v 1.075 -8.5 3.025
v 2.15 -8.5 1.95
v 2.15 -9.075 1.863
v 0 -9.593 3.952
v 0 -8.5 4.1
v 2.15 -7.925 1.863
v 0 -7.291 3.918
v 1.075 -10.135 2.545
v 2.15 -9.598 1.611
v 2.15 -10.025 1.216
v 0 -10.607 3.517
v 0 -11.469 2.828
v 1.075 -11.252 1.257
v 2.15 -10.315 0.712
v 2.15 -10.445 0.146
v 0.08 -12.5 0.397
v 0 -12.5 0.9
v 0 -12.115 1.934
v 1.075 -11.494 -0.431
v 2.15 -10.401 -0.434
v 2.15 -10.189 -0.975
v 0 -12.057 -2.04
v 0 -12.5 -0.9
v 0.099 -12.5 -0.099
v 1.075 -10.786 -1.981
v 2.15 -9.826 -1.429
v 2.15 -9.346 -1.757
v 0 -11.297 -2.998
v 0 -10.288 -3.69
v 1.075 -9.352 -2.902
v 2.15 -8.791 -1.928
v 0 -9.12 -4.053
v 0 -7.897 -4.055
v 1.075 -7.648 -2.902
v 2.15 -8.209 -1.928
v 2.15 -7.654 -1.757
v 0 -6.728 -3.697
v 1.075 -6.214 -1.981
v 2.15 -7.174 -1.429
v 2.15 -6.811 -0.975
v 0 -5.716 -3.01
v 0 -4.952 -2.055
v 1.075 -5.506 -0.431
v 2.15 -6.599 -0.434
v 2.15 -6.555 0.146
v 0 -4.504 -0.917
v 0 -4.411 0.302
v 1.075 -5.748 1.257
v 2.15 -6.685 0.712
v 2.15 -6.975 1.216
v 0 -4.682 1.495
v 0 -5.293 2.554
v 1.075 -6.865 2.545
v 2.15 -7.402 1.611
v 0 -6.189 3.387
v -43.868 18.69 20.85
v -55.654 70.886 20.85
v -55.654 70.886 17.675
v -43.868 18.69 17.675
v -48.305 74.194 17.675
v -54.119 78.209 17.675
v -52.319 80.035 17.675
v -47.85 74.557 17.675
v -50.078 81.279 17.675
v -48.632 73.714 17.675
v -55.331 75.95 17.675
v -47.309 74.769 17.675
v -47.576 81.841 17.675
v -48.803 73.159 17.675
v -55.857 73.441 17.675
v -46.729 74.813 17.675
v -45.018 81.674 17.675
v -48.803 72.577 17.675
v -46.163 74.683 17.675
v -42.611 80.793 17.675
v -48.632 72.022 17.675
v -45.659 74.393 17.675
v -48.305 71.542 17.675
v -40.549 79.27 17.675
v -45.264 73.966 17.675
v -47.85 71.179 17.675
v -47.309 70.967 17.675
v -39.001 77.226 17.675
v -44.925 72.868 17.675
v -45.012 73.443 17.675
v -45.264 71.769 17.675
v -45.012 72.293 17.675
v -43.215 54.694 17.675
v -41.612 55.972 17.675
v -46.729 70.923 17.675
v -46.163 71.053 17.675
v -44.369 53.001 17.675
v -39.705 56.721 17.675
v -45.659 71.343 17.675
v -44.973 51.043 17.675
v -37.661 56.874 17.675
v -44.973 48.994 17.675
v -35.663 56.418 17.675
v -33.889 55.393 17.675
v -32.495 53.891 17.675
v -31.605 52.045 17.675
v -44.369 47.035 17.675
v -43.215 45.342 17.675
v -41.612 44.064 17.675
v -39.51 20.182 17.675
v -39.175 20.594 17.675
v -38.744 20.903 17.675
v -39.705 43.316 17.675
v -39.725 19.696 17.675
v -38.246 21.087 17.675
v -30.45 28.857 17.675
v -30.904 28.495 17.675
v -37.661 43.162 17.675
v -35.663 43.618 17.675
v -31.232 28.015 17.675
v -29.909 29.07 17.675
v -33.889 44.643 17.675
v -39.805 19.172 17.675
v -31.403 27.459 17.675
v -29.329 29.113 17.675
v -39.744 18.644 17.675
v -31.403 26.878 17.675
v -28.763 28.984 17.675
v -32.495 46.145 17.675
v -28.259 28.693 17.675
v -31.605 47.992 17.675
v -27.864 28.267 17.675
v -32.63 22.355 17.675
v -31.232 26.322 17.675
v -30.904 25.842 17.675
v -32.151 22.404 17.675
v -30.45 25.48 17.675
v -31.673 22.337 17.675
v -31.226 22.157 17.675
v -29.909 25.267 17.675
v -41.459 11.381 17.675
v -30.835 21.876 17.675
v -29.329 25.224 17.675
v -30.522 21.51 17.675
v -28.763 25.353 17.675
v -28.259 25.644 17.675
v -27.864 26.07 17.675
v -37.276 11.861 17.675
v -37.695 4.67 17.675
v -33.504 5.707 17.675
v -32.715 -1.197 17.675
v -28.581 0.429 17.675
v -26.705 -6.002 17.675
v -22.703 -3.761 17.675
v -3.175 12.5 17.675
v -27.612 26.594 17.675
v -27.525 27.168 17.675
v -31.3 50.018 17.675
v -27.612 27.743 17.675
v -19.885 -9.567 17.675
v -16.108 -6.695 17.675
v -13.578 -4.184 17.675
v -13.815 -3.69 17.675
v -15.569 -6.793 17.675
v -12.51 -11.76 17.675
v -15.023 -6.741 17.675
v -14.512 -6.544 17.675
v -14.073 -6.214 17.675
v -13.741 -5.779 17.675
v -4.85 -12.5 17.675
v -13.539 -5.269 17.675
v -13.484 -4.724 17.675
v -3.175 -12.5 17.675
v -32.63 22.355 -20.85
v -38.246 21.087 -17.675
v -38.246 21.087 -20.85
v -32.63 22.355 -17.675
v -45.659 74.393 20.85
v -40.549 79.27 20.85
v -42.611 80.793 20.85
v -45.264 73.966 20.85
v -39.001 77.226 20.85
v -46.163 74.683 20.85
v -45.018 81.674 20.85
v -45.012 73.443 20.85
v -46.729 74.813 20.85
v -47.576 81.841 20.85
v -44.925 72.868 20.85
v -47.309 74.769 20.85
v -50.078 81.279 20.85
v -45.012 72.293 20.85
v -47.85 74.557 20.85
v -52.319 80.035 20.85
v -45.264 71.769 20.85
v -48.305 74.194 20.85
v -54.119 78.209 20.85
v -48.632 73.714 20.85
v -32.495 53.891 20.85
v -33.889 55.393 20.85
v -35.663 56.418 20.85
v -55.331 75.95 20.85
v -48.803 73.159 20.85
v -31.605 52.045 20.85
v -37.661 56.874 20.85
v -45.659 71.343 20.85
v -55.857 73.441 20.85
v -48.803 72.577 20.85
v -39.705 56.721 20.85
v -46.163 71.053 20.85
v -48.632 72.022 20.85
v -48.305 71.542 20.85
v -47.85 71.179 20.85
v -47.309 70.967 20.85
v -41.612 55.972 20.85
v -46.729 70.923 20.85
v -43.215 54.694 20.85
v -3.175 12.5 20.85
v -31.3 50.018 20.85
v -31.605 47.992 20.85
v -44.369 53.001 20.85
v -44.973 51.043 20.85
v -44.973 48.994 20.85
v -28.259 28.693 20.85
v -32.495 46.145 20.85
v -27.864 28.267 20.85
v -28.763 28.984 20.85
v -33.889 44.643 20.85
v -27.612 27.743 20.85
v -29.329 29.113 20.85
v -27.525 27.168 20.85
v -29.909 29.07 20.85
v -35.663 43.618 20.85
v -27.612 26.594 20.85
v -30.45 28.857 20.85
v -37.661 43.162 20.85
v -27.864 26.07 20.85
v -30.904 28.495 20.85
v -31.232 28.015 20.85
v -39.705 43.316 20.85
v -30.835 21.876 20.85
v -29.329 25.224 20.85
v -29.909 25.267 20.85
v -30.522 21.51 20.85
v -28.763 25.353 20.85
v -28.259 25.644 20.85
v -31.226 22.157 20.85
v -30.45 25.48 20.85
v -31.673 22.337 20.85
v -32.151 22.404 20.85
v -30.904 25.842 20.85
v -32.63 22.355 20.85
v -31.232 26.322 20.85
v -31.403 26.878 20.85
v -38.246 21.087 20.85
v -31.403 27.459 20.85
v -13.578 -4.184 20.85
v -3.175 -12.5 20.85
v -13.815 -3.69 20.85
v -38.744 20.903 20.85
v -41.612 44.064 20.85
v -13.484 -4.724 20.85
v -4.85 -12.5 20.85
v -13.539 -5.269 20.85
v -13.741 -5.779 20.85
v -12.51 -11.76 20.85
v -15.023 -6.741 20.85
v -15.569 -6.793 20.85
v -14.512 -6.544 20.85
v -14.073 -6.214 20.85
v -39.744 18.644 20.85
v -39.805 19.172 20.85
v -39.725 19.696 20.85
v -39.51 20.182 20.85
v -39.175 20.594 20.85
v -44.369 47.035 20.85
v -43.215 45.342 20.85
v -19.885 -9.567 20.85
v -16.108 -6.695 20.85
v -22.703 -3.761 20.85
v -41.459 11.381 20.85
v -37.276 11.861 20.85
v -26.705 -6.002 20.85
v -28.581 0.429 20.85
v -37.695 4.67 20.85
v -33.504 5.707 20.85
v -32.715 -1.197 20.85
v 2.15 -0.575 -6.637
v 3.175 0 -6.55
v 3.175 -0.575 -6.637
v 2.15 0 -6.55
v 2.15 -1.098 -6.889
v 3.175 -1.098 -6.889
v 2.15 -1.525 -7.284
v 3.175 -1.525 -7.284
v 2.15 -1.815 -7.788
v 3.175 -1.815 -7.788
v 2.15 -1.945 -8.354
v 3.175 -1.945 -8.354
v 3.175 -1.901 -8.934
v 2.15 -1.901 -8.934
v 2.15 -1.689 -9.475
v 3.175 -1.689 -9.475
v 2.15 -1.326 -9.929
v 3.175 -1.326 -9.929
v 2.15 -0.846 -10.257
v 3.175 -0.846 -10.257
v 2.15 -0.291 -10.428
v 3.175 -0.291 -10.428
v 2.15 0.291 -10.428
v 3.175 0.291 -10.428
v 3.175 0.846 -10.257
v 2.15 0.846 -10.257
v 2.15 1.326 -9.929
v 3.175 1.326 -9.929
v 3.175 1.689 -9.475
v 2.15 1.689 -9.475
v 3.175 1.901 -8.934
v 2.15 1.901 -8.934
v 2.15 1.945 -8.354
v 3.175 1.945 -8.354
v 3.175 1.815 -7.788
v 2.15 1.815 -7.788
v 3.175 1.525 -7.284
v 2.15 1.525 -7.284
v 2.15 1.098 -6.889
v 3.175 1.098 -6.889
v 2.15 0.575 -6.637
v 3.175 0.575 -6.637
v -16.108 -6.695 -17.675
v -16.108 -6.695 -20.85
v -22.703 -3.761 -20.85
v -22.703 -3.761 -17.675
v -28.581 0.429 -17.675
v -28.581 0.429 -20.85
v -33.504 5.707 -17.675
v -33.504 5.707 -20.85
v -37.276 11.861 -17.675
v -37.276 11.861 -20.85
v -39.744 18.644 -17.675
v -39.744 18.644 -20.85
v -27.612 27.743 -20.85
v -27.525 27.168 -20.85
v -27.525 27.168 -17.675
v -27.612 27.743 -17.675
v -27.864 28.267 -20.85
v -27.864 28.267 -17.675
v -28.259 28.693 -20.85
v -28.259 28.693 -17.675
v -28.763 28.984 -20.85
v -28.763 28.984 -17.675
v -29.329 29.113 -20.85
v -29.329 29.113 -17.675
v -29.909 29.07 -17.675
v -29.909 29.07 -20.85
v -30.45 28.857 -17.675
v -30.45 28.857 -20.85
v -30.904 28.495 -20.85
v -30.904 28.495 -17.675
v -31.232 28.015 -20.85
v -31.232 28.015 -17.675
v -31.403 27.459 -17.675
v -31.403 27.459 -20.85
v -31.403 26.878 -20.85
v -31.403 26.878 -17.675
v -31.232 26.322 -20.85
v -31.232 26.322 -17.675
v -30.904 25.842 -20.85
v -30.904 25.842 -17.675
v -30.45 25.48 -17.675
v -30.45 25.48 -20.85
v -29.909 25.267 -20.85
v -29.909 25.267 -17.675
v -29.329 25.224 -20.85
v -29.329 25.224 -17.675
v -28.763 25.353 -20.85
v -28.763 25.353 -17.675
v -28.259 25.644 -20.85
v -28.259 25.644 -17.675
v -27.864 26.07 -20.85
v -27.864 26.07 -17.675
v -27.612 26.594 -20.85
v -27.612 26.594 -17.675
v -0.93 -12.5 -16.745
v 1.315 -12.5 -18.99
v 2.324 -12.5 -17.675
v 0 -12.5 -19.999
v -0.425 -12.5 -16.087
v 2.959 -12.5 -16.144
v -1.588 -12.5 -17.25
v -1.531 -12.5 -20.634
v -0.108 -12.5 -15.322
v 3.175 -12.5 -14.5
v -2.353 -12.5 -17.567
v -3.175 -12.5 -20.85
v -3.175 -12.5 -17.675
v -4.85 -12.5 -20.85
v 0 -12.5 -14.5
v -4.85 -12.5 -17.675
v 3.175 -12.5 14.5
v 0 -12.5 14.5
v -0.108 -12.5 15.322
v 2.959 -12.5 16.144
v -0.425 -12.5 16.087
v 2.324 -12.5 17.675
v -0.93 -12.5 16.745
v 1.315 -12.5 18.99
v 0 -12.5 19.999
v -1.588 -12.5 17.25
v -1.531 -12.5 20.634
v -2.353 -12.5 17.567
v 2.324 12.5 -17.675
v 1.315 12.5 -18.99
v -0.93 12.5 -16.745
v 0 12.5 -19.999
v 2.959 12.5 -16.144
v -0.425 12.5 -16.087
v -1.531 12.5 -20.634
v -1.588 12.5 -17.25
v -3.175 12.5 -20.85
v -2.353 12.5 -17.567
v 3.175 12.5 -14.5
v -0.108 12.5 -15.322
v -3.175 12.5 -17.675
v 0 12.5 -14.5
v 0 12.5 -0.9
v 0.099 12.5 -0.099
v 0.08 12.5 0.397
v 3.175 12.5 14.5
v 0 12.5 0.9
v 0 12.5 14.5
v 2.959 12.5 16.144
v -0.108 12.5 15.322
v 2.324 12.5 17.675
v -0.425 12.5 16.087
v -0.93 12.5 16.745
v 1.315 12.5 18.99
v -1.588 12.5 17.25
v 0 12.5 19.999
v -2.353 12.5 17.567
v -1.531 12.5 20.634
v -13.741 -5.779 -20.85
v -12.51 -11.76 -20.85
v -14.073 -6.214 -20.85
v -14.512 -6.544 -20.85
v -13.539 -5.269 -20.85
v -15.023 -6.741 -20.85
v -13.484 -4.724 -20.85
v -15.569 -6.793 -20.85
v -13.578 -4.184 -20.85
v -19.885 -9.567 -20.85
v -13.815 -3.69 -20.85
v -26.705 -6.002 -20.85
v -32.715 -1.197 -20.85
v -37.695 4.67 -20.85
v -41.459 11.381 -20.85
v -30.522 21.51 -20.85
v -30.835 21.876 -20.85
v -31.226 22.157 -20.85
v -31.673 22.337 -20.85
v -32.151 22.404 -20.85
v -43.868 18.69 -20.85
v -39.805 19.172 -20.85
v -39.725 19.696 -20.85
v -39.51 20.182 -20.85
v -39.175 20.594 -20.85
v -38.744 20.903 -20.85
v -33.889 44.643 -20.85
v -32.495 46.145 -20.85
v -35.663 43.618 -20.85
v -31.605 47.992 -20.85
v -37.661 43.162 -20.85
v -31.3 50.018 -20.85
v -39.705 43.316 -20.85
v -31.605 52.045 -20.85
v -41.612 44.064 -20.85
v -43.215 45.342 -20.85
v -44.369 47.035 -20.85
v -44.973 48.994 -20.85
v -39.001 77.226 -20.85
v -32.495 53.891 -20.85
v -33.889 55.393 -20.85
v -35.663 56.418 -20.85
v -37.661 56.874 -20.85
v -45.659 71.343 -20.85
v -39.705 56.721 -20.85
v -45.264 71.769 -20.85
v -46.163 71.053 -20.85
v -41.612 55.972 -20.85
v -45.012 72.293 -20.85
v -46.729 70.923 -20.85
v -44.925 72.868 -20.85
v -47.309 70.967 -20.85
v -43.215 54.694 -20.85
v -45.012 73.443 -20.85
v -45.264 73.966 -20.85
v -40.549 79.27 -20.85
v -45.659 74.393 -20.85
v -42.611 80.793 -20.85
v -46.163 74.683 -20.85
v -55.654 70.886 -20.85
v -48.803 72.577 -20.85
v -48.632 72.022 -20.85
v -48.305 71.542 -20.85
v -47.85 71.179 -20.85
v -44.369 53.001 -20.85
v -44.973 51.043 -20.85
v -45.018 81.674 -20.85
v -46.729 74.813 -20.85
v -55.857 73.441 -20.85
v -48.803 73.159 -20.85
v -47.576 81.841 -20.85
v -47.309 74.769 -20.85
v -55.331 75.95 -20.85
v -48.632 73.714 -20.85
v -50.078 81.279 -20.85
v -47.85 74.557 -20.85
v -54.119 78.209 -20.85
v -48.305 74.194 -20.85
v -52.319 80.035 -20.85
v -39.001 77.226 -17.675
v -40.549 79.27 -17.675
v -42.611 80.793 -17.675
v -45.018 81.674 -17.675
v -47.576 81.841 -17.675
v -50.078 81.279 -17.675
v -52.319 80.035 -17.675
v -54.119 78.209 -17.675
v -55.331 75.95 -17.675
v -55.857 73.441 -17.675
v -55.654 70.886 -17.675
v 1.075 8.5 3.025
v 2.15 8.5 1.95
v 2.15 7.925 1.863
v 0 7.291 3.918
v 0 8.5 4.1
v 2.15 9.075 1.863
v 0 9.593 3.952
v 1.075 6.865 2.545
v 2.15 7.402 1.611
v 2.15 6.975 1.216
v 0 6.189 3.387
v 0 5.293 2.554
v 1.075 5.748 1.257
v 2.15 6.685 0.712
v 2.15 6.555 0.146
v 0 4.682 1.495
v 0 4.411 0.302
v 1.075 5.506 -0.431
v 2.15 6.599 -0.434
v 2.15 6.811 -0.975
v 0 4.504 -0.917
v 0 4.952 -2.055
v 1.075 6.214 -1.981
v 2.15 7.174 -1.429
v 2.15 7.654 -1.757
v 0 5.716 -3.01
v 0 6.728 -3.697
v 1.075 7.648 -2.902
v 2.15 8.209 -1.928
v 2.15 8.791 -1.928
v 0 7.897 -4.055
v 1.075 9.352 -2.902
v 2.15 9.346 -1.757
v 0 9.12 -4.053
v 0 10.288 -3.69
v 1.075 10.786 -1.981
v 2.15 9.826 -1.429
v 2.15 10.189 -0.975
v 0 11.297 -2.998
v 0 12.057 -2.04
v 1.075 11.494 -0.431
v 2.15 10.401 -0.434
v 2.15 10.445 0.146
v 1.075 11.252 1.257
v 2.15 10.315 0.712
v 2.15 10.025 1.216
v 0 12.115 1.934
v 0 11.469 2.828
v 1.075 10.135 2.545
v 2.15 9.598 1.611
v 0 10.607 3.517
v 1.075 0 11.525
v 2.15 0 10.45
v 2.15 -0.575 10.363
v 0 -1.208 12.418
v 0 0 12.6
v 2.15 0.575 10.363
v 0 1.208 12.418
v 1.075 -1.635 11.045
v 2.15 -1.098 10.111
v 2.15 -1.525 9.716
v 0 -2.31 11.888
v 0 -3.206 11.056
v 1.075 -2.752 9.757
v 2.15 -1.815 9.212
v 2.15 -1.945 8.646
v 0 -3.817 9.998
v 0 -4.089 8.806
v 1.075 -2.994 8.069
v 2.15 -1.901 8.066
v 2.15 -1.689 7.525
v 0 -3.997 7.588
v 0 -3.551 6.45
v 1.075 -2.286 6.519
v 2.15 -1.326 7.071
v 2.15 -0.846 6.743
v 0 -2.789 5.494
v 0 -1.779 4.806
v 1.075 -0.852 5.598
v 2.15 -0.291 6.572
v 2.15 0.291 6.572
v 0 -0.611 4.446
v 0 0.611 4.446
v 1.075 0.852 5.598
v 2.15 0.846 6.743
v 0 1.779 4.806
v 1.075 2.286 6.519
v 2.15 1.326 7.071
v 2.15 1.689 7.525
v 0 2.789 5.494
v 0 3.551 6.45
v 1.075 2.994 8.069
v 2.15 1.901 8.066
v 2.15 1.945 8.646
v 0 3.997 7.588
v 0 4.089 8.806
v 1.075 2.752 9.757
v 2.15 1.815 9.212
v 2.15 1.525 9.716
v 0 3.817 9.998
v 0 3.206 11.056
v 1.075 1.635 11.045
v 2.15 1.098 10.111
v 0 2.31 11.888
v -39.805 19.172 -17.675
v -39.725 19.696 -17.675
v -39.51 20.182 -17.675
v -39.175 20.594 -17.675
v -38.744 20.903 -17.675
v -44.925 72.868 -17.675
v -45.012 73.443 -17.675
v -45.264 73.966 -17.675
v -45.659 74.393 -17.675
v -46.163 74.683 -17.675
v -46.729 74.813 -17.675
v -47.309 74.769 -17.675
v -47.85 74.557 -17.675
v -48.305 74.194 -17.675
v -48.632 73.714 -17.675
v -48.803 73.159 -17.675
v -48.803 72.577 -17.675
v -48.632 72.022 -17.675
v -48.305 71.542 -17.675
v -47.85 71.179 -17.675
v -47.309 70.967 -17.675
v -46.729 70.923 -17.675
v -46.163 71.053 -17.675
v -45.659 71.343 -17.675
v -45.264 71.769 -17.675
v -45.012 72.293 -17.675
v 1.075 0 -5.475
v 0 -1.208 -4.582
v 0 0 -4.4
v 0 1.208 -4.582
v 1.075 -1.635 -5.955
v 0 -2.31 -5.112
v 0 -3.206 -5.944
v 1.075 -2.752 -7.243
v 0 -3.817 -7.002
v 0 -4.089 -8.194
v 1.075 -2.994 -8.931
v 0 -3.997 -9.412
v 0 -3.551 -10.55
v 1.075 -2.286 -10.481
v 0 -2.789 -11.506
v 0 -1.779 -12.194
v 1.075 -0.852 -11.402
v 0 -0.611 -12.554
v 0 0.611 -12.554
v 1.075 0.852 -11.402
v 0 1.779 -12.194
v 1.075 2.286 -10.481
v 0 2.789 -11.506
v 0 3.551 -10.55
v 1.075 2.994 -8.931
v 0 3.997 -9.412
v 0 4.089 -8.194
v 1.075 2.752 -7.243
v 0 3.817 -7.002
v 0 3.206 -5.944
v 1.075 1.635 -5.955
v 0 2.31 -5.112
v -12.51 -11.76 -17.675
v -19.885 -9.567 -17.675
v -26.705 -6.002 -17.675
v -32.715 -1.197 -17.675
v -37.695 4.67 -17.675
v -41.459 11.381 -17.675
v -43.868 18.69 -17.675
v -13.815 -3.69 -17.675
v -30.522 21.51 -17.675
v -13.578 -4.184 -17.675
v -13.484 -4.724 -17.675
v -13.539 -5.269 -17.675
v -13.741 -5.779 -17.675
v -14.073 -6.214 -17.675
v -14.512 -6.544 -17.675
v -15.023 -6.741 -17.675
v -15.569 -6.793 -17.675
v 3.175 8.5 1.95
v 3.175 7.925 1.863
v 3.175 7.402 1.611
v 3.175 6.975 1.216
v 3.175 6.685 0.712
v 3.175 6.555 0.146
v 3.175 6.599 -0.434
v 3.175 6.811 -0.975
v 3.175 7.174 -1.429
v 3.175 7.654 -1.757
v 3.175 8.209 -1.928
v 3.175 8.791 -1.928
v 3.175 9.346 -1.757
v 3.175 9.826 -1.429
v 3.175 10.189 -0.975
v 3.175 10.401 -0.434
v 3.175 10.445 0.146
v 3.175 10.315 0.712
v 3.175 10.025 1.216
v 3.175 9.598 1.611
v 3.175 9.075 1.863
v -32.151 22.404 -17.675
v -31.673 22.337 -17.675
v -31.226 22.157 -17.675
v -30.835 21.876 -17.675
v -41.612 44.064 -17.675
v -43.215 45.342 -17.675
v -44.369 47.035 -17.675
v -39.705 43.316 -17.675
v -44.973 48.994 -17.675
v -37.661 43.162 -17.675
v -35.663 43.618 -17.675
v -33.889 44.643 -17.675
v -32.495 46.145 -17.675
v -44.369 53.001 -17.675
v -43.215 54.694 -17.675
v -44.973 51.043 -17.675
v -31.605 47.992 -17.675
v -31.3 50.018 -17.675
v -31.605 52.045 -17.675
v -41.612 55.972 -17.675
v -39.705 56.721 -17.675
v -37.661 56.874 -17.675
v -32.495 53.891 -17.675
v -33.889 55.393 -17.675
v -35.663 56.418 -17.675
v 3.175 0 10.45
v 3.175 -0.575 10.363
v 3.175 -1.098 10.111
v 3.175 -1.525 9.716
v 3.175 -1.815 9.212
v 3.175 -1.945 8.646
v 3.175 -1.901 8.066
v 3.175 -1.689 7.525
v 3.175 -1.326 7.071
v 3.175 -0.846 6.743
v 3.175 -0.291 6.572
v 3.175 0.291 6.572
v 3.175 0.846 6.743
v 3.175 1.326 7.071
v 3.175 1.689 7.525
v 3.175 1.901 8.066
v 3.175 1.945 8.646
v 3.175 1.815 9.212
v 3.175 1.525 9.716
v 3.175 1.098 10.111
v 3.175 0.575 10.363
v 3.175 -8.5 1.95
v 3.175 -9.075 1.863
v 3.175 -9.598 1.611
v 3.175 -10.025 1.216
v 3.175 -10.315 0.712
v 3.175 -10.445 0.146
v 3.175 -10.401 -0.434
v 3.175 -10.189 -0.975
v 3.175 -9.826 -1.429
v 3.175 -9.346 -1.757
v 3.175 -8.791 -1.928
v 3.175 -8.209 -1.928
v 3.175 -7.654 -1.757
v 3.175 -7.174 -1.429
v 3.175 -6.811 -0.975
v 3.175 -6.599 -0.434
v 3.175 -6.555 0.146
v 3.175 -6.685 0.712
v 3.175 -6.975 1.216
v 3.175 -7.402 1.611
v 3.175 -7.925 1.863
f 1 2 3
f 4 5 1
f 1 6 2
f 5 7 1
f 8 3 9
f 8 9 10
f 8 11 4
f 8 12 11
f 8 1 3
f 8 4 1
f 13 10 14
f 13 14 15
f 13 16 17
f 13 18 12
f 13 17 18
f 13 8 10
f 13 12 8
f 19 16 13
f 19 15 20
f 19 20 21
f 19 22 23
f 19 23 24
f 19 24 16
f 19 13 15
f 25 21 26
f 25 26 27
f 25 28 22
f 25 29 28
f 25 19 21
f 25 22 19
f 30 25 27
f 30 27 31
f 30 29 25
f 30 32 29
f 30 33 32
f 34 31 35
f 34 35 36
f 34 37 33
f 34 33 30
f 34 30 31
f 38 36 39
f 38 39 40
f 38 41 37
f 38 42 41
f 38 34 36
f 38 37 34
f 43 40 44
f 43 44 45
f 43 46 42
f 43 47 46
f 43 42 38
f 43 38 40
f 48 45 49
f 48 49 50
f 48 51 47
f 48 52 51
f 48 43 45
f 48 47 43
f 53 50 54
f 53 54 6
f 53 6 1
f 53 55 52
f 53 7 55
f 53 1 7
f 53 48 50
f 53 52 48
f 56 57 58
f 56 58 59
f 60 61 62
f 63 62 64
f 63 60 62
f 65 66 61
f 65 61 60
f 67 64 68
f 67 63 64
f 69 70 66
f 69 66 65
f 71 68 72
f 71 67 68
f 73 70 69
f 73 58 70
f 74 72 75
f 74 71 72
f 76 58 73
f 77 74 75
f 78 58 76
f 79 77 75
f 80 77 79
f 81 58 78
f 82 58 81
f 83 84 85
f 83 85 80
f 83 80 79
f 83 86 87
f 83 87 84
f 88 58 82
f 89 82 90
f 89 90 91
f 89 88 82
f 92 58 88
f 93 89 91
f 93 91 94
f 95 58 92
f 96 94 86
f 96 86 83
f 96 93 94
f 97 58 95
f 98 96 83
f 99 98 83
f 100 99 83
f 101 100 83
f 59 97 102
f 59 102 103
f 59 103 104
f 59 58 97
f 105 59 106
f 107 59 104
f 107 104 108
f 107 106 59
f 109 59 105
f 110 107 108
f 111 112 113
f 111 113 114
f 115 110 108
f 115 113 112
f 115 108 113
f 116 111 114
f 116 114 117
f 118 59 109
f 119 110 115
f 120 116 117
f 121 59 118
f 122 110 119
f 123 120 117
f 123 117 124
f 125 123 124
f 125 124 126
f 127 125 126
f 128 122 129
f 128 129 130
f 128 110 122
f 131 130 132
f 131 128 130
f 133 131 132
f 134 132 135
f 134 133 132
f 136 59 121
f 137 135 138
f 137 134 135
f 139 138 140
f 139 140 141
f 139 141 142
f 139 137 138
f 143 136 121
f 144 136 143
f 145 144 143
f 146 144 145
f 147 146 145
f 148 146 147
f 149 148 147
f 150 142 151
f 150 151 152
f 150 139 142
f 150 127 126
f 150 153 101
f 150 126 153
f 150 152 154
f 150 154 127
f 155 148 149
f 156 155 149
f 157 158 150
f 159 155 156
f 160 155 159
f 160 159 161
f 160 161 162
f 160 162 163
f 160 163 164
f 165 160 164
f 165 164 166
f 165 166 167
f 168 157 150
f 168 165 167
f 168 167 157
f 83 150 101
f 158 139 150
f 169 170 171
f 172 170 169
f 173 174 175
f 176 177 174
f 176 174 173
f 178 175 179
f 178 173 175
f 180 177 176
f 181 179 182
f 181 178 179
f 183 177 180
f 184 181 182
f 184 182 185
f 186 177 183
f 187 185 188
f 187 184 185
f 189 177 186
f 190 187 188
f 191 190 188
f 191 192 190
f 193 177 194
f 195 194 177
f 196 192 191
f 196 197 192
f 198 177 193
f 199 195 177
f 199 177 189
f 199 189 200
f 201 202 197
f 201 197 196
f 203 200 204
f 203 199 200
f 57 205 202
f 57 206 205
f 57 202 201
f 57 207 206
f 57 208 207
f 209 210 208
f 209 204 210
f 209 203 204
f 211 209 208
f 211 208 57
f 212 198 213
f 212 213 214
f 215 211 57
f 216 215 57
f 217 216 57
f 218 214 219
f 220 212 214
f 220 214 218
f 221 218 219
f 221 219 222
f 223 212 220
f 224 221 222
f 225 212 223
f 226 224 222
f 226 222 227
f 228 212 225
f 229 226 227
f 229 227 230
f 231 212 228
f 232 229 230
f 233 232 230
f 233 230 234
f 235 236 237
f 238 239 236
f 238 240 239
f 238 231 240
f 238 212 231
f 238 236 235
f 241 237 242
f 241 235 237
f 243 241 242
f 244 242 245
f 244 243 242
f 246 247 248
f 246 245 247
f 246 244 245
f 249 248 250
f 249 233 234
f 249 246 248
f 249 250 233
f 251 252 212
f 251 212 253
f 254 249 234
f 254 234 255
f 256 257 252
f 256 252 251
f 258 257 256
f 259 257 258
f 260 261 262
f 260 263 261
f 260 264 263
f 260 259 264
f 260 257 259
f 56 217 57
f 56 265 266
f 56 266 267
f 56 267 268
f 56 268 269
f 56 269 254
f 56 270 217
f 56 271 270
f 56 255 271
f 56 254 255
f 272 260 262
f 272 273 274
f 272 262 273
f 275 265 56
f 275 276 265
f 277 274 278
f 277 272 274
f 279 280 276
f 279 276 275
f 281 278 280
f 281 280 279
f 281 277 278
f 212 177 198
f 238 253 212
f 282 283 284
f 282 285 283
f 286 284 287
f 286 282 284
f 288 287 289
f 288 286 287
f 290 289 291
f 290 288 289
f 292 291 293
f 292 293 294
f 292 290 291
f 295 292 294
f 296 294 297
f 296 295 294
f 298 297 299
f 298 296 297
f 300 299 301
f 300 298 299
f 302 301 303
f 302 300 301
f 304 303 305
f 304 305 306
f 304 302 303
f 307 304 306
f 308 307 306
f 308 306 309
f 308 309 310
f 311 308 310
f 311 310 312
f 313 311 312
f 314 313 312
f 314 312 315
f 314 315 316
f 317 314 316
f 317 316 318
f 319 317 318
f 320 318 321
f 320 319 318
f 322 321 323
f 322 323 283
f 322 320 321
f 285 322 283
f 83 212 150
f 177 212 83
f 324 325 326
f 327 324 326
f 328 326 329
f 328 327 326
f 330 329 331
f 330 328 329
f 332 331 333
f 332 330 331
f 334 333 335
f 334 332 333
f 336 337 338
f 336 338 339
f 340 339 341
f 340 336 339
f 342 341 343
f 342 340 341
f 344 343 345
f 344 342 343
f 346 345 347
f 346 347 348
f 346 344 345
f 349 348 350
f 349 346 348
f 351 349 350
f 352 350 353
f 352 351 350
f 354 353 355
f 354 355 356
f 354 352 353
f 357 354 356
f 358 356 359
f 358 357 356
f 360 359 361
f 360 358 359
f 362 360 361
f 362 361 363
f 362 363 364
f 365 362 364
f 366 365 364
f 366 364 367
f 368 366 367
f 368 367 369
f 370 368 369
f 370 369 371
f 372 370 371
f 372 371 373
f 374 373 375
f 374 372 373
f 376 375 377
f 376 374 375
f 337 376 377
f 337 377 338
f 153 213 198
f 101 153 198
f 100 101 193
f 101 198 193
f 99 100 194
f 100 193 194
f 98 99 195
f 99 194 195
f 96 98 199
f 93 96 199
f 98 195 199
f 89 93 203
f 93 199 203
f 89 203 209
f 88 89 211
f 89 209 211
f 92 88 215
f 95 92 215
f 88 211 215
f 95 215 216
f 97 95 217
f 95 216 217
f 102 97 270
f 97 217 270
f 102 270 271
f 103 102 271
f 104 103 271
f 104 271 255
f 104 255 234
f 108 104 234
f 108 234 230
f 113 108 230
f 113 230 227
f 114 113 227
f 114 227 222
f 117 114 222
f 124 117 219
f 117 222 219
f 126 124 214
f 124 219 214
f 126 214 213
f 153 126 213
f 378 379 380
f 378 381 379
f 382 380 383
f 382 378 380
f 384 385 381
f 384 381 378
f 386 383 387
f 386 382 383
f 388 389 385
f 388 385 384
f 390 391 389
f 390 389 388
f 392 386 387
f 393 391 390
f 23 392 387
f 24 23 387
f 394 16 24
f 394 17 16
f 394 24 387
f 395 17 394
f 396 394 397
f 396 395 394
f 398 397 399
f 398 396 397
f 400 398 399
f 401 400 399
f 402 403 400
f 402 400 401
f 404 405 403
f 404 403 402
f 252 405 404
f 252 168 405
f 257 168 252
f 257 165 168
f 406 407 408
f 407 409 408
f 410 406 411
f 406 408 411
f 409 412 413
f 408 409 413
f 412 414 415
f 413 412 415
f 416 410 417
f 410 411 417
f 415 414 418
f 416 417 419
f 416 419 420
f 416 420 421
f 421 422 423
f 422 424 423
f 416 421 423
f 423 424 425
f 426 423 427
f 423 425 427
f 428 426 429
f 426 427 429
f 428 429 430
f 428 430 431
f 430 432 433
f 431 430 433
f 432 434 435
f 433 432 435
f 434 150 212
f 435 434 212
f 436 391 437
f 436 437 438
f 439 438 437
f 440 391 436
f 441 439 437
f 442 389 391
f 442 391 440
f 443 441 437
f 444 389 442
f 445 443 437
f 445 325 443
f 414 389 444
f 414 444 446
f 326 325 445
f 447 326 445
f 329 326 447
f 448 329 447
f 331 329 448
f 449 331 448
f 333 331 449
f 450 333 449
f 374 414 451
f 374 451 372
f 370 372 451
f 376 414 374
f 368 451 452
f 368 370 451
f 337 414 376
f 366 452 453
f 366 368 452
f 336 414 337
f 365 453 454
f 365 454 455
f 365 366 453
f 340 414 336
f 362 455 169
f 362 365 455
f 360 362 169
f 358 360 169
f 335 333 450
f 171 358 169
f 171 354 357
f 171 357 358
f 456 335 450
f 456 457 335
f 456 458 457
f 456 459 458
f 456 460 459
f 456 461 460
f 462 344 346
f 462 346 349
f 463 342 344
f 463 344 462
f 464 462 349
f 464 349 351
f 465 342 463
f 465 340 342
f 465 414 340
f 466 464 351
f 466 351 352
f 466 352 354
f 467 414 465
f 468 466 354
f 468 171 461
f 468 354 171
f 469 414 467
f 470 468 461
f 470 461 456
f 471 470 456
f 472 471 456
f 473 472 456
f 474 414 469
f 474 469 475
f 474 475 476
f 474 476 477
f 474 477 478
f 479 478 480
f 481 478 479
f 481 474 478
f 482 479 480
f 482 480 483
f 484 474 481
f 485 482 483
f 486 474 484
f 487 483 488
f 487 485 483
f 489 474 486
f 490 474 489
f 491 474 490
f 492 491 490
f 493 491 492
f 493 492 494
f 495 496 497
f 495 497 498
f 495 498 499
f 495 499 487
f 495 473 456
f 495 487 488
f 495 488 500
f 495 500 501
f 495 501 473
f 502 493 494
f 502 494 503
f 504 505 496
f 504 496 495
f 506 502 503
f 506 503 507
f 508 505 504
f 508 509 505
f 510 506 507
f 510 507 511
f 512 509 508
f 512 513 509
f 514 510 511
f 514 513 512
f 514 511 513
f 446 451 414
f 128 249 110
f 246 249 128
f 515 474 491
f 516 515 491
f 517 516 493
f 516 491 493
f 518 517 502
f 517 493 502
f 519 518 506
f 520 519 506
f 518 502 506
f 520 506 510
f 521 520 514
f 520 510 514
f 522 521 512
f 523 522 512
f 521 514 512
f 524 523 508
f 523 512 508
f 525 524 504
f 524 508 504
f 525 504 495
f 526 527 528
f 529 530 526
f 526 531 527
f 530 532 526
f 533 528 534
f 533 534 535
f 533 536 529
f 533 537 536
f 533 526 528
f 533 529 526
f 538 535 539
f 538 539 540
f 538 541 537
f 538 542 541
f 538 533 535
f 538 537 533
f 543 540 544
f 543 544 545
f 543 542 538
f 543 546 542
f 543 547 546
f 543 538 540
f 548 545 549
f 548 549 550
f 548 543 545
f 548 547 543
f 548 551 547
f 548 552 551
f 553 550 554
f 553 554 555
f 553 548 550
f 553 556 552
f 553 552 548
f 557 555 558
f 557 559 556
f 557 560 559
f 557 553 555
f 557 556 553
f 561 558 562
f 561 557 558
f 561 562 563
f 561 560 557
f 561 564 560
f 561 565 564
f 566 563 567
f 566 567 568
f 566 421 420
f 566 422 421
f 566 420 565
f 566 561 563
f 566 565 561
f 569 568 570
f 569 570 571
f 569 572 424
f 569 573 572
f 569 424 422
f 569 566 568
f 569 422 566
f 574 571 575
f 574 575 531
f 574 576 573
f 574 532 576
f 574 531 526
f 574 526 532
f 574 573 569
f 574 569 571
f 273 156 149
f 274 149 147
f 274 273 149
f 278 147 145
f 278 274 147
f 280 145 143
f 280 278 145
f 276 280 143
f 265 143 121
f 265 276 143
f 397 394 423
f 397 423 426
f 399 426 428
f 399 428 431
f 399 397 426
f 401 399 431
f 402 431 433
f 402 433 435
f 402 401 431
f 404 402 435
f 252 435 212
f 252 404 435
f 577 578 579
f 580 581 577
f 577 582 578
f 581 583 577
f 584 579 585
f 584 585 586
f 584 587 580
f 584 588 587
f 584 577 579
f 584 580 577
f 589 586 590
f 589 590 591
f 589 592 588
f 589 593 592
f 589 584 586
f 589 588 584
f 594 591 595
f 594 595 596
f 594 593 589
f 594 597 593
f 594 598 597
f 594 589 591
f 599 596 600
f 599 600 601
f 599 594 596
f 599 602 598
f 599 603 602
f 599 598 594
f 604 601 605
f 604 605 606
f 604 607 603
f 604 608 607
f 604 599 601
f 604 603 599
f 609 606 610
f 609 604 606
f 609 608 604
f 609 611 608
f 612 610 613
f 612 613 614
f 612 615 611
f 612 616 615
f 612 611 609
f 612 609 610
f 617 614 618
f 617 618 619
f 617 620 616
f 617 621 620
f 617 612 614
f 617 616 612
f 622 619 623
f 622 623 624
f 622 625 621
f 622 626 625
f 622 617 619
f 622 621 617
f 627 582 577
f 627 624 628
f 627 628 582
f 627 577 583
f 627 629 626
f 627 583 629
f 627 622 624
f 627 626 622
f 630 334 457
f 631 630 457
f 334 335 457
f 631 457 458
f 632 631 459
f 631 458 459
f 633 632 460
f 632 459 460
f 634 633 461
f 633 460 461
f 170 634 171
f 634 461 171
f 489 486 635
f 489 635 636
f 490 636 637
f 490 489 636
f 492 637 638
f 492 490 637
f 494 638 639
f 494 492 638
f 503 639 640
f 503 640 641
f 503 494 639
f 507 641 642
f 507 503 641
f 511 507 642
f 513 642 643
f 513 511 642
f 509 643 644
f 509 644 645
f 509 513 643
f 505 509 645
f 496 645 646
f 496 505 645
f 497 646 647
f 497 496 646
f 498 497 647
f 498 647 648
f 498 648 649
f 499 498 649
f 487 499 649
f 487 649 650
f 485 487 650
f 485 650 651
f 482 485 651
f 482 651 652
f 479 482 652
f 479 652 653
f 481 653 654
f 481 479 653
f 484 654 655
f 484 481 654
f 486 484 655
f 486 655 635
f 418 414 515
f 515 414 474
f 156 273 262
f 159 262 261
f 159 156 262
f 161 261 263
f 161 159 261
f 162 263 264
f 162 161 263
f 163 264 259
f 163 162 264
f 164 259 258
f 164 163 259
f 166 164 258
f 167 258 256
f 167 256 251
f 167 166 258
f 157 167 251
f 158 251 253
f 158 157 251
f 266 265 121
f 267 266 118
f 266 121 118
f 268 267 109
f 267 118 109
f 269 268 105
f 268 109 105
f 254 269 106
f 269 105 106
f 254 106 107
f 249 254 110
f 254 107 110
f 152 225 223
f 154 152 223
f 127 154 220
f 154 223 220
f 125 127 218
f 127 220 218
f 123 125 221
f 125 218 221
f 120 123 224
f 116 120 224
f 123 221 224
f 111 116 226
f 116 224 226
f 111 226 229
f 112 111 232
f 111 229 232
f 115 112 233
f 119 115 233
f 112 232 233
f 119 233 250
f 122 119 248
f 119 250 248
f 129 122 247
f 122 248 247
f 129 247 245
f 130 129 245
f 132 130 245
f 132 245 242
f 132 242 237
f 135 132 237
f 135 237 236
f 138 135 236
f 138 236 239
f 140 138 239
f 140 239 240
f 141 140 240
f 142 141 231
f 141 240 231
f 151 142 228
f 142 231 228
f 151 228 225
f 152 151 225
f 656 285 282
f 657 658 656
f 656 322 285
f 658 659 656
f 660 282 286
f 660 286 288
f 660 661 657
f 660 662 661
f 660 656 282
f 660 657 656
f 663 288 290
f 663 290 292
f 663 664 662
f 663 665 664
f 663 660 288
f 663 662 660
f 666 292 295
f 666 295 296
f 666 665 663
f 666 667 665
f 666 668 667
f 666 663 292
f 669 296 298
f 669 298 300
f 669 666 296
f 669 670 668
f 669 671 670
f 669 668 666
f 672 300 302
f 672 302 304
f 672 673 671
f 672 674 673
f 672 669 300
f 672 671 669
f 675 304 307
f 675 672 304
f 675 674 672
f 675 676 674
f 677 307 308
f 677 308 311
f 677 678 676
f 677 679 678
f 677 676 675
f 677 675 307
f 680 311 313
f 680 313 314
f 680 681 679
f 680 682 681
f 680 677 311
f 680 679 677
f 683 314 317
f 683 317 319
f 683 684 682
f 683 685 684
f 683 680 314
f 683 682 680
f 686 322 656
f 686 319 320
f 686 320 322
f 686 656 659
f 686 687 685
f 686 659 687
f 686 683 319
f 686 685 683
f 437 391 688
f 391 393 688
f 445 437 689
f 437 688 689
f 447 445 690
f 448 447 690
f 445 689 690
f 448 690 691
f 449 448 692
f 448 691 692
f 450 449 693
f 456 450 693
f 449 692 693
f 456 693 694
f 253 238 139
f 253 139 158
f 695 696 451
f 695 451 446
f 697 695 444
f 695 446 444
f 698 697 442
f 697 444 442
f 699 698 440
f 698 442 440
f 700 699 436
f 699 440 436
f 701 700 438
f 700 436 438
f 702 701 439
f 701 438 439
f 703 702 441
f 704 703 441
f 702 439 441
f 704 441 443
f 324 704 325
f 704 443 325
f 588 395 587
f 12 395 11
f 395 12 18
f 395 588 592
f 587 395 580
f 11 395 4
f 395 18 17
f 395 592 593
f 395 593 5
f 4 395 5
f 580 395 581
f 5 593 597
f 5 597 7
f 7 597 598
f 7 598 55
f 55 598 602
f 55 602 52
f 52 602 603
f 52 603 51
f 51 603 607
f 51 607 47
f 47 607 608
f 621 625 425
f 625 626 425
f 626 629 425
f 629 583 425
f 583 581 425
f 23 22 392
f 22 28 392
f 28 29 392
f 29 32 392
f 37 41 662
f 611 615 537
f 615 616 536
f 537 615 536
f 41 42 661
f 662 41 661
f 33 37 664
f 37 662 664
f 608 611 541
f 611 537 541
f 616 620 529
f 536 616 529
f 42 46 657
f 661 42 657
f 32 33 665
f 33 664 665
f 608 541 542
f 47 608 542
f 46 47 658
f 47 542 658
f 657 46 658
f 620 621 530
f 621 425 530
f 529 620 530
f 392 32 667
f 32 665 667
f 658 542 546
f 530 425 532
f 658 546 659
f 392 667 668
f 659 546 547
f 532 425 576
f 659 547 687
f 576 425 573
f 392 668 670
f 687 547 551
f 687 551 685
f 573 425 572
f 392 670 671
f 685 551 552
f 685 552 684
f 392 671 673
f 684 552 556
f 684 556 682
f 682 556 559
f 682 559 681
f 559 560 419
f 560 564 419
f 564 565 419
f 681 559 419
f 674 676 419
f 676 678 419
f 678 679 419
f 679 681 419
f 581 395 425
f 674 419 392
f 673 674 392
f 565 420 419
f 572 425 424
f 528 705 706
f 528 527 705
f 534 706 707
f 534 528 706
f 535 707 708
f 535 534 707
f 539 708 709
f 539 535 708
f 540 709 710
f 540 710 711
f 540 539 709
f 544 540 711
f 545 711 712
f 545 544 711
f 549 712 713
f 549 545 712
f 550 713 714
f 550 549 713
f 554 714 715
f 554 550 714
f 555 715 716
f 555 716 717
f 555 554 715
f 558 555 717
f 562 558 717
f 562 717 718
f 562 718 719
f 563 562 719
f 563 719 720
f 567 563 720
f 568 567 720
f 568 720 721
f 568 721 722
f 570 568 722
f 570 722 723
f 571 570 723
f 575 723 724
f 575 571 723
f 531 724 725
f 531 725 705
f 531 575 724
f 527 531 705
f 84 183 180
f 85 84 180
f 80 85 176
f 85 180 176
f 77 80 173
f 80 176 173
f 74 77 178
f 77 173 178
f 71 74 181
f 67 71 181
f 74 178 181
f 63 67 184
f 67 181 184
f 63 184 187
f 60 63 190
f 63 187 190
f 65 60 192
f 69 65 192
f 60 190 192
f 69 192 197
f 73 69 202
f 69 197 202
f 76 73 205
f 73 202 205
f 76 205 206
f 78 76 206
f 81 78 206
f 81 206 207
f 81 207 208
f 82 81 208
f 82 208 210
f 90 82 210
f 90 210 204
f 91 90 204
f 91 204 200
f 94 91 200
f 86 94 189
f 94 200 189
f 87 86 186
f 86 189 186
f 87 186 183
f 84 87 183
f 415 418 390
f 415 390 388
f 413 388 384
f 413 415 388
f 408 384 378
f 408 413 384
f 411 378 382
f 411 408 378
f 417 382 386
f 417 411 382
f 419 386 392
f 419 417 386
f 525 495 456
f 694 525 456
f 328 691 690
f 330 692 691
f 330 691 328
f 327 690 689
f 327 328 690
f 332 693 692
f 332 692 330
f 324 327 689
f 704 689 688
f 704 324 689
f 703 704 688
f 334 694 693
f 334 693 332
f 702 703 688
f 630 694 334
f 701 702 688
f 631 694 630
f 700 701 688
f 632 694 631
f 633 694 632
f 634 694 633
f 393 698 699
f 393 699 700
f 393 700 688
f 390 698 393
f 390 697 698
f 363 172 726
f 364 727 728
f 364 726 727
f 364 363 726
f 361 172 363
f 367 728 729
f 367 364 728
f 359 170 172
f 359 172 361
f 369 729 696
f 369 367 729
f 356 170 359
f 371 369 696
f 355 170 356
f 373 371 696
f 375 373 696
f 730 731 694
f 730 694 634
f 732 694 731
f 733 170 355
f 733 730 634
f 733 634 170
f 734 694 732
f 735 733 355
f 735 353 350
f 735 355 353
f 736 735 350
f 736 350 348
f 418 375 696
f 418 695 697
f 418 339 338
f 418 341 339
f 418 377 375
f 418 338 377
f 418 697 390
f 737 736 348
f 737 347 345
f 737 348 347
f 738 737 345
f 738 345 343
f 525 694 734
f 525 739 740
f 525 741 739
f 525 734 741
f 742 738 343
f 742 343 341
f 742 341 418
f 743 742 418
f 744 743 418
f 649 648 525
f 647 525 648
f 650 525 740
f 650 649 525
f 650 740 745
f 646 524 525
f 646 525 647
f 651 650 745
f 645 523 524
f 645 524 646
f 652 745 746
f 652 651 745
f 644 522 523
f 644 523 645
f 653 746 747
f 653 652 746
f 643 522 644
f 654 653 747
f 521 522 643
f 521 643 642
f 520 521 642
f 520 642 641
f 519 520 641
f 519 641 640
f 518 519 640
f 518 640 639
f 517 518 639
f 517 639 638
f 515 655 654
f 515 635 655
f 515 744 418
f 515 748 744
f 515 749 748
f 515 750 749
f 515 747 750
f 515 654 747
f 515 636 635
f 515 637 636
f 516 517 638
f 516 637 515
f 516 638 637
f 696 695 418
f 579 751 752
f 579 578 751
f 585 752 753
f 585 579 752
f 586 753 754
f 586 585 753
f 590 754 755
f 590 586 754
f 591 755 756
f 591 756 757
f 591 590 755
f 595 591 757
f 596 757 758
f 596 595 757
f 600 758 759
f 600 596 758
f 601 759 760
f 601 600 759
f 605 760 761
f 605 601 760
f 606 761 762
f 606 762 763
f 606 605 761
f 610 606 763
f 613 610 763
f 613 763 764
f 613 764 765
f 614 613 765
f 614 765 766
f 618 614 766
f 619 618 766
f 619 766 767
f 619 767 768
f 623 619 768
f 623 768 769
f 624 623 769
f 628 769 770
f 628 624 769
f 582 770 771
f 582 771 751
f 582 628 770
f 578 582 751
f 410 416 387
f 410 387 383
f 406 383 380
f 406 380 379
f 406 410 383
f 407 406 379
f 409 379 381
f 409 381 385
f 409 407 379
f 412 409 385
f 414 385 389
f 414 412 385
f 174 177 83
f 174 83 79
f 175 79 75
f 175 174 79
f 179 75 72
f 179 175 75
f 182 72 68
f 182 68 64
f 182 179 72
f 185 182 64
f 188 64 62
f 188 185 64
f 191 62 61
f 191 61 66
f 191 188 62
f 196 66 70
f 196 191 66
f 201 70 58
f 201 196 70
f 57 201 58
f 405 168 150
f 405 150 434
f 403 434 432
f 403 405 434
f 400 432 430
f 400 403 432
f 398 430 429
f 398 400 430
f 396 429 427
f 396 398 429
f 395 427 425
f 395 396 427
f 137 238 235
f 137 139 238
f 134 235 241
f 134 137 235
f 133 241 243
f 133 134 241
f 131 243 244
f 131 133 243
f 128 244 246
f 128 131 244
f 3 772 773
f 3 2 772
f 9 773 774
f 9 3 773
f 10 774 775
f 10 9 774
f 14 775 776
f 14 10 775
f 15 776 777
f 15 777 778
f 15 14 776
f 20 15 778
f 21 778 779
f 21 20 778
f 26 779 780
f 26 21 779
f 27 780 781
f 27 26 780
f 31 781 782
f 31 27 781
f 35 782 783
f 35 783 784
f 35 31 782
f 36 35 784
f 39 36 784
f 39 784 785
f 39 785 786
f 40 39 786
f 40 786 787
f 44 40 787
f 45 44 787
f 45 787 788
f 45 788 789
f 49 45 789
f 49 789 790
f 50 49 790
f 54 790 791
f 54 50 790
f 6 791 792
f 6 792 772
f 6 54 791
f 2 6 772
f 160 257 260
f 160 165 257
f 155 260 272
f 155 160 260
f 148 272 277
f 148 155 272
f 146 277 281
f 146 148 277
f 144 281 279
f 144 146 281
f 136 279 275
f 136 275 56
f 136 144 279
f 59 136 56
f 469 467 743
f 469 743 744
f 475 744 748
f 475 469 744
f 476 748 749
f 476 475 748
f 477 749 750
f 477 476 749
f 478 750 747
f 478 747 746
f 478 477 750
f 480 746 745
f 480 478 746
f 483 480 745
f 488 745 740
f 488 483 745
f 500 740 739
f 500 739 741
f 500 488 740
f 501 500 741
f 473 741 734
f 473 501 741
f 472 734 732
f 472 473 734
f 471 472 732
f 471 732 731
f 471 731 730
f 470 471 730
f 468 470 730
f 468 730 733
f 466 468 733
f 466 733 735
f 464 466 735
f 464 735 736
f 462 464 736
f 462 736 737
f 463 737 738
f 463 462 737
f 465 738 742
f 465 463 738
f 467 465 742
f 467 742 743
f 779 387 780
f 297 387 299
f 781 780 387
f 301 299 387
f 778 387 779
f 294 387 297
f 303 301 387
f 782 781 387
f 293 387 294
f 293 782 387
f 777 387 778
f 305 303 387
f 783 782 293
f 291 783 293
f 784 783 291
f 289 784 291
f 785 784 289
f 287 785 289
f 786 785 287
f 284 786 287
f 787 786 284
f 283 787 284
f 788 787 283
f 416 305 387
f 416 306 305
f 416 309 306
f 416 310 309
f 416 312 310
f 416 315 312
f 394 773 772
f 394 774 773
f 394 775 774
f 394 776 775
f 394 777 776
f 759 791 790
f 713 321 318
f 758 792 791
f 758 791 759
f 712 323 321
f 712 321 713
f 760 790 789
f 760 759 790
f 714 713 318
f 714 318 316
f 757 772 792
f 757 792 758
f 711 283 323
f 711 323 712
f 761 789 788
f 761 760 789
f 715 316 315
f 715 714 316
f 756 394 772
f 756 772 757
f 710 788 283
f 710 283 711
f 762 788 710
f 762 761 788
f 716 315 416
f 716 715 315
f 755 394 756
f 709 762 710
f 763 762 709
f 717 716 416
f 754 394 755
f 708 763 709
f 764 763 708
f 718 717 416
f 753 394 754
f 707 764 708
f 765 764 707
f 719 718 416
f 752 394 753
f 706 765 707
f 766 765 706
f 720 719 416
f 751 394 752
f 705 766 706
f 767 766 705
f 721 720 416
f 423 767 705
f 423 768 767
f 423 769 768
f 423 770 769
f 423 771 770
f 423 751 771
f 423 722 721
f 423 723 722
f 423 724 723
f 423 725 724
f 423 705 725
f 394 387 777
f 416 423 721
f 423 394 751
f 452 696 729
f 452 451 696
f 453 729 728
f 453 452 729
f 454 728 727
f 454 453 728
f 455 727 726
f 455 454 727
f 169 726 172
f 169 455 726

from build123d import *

# Parameters (mm, degrees)
SKETCH2_W                                      = 29
SKETCH2_H                                      = 25
BOSS_EXTRUDE1_DEPTH                            = 6.35
CONVERT_SOLID1_START                           = 3.175
CONVERT_SOLID1_OUTLINE_W                       = 25
CONVERT_SOLID1_OUTLINE_H                       = 29
CONVERT_SOLID1_DEPTH                           = 3.175
CSK_FOR_M3_5_FLAT_HEAD_MACHINE_SCREW1_AT_COUNT = 2
CSK_FOR_M3_5_FLAT_HEAD_MACHINE_SCREW1_AT_PITCH = 12.02081528
CSK_FOR_M3_5_FLAT_HEAD_MACHINE_SCREW_2_COUNT   = 2
CSK_FOR_M3_5_FLAT_HEAD_MACHINE_SCREW_2_PITCH   = 17
CSK_FOR_M3_5_FLAT_HEAD_MACHINE_SCREW_3_COUNT   = 2
CSK_FOR_M3_5_FLAT_HEAD_MACHINE_SCREW_3_PITCH   = 12.02081528
EDGE_FLANGE1_DEPTH                             = 25
EDGE_FLANGE1_BEND_DEPTH                        = 25
SKETCH23_R                                     = 1.95
SKETCH23_R_2                                   = 6.875
BOSS_EXTRUDE2_DEPTH                            = 3.175
FILLET1_R                                      = 40
SKETCH25_R                                     = 1.95
SKETCH25_R_2                                   = 6.875
CUT_EXTRUDE3_DEPTH                             = 108.532674661
FILLET2_R                                      = 2


# Read off the part's stored shape, not the designer's step: Convert-Solid1
# Sheet-metal steps are written as plain solids
with BuildPart() as part:
    # Sketch2 → Boss-Extrude1 (new body)
    with BuildSketch(Plane(origin=(0, 0, 0), x_dir=(0, 0, -1), z_dir=(1, 0, 0))):
        Rectangle(SKETCH2_W, SKETCH2_H)
    extrude(amount=BOSS_EXTRUDE1_DEPTH)

    # Convert-Solid1 outline → Convert-Solid1 (cut)
    with BuildSketch(Plane.YZ.offset(CONVERT_SOLID1_START)):
        Rectangle(CONVERT_SOLID1_OUTLINE_W, CONVERT_SOLID1_OUTLINE_H)
    extrude(amount=CONVERT_SOLID1_DEPTH, mode=Mode.SUBTRACT)

    # Sketch4 → CSK for M3.5 Flat Head Machine Screw1 (revolve, cut)
    with BuildSketch(Plane.ZX.offset(-8.5)):
        Polygon((0, 0), (0, 3.175), (1.95, 3.175), (1.95, 2.15), (4.1, 0), align=None)
    csk_for_m3_5_flat_head_machine_screw1 = revolve(axis=Axis((-6.35, -8.5, 0), (1, 0, 0)), mode=Mode.SUBTRACT)

    # CSK for M3.5 Flat Head Machine Screw1 at: CSK for M3.5 Flat Head Machine Screw1 ×2
    with Locations(*[Vector(0, 0.7071067811865476, 0.7071067811865476) * (i * CSK_FOR_M3_5_FLAT_HEAD_MACHINE_SCREW1_AT_PITCH) for i in range(1, CSK_FOR_M3_5_FLAT_HEAD_MACHINE_SCREW1_AT_COUNT)]):
        add(csk_for_m3_5_flat_head_machine_screw1, mode=Mode.SUBTRACT)

    # CSK for M3.5 Flat Head Machine Screw 2: CSK for M3.5 Flat Head Machine Screw1 ×2
    with Locations(*[(0, i * CSK_FOR_M3_5_FLAT_HEAD_MACHINE_SCREW_2_PITCH, 0) for i in range(1, CSK_FOR_M3_5_FLAT_HEAD_MACHINE_SCREW_2_COUNT)]):
        add(csk_for_m3_5_flat_head_machine_screw1, mode=Mode.SUBTRACT)

    # CSK for M3.5 Flat Head Machine Screw 3: CSK for M3.5 Flat Head Machine Screw1 ×2
    with Locations(*[Vector(0, 0.7071067811865476, -0.7071067811865476) * (i * CSK_FOR_M3_5_FLAT_HEAD_MACHINE_SCREW_3_PITCH) for i in range(1, CSK_FOR_M3_5_FLAT_HEAD_MACHINE_SCREW_3_COUNT)]):
        add(csk_for_m3_5_flat_head_machine_screw1, mode=Mode.SUBTRACT)

    # Edge-Flange1 section (across the edge) → Edge-Flange1 (add)
    with BuildSketch(Plane(origin=(0, 12.5, -17.675), x_dir=(0, 0, 1), z_dir=(0, -1, 0))):
        with BuildLine():
            Line((-3.175, 3.175), (-3.175, 36.825))
            Line((-3.175, 36.825), (0, 36.825))
            Line((0, 36.825), (0, 3.175))
            ThreePointArc((0, 3.175), (0.92993597, 0.92993597), (3.175, 0))
            Line((3.175, 0), (3.175, -3.175))
            ThreePointArc((3.175, -3.175), (-1.315128061, -1.315128061), (-3.175, 3.175))
        make_face()
    extrude(amount=EDGE_FLANGE1_DEPTH)

    # Edge-Flange1 section 2 (across the edge) → Edge-Flange1 bend (add)
    with BuildSketch(Plane(origin=(0, -12.5, 17.675), x_dir=(0, 0, -1), z_dir=(0, 1, 0))):
        with BuildLine():
            Line((-3.175, 3.175), (-3.175, 36.825))
            Line((-3.175, 36.825), (0, 36.825))
            Line((0, 36.825), (0, 3.175))
            ThreePointArc((0, 3.175), (0.92993597, 0.92993597), (3.175, 0))
            Line((3.175, 0), (3.175, -3.175))
            ThreePointArc((3.175, -3.175), (-1.315128061, -1.315128061), (-3.175, 3.175))
        make_face()
    extrude(amount=EDGE_FLANGE1_BEND_DEPTH)

    # Sketch23 → Boss-Extrude2 (add)
    with BuildSketch(Plane.XY.offset(20.85)):
        with BuildLine():
            Line((-3.175, -12.5), (-3.175, 12.5))
            Line((-3.175, 12.5), (-39.000765285, 77.226355048))
            ThreePointArc((-39.000765285, 77.226355048), (-50.077531286, 81.278922457), (-55.654025191, 70.885618681))
            Line((-55.654025191, 70.885618681), (-36.825, -12.5))
            Line((-36.825, -12.5), (-3.175, -12.5))
        make_face()
        with Locations((-46.875056501, 72.867967978)):
            Circle(SKETCH23_R, mode=Mode.SUBTRACT)
        with Locations((-29.474943499, 27.168448642)):
            Circle(SKETCH23_R, mode=Mode.SUBTRACT)
        with Locations((-38.175, 50.01820831)):
            Circle(SKETCH23_R_2, mode=Mode.SUBTRACT)
    boss_extrude2 = extrude(amount=-BOSS_EXTRUDE2_DEPTH)

    # Mirror3: Boss-Extrude2 across plane
    add(boss_extrude2.mirror(Plane.XY))

    # Fillet1
    fillet1_edges = [part.edges().sort_by_distance(p)[0] for p in [
        (-36.825, -12.5, -19.2625),
        (-36.825, -12.5, 19.2625),
    ]]
    fillet(fillet1_edges, radius=FILLET1_R)

    # Sketch25 → Cut-Extrude3 (cut, through all)
    with BuildSketch(Plane.XY.offset(20.85)):
        with Locations((-46.875056501, 72.867967978)):
            Circle(SKETCH25_R)
        with Locations((-38.175, 50.01820831)):
            Circle(SKETCH25_R_2)
        with Locations((-29.474943499, 27.168448642)):
            Circle(SKETCH25_R)
        with BuildLine():
            Line((-40.192024973, 20.647751172), (-31.28455236, 22.659117506))
            Line((-31.28455236, 22.659117506), (-10.974113473, -7.975305792))
            ThreePointArc((-10.974113473, -7.975305792), (-30.042886429, 1.783719979), (-40.192024973, 20.647751172))
        make_face()
    extrude(amount=-CUT_EXTRUDE3_DEPTH, mode=Mode.SUBTRACT)

    # Fillet2
    fillet2_edges = [part.edges().sort_by_distance(p)[0] for p in [
        (-31.28455236, 22.659117506, 19.2625),
        (-10.974113473, -7.975305792, 19.2625),
        (-40.192024973, 20.647751172, 19.2625),
        (-31.28455236, 22.659117506, -19.2625),
        (-10.974113473, -7.975305792, -19.2625),
        (-40.192024973, 20.647751172, -19.2625),
    ]]
    fillet(fillet2_edges, radius=FILLET2_R)


solid = part.part
